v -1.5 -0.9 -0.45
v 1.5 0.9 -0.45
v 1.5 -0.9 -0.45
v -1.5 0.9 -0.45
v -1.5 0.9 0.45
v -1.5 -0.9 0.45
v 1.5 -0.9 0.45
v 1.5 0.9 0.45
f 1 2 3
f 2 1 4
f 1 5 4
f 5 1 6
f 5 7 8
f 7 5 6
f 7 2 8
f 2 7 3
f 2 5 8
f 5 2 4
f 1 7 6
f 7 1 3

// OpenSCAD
// SMD package target overall size: [3.0, 1.8, 0.9] (L, W, H)
// One connected solid, simple rectangular SMD with subtle end terminations.

$fn = 48;

// -------- Parameters --------
L = 3.0;   // X overall
W = 1.8;   // Y overall
H = 0.9;   // Z overall

// Terminations (kept within overall envelope)
term_len   = 0.55;  // along X from each end
term_thk   = 0.08;  // metal thickness (top/bottom)
term_drop  = 0.22;  // wrap down the end face (from top)
term_inset = 0.06;  // inset from Y edges

// Small top mark (subtle)
mark_d = 0.35;
mark_h = 0.03;

overlap = 0.02;     // ensures connectivity / avoids coplanar issues

// -------- Helpers --------
function clamp(v, lo, hi) = v < lo ? lo : (v > hi ? hi : v);

// -------- Body (simple rectangular) --------
module body_solid() {
    cube([L, W, H], center=true);
}

// -------- Termination (end cap) --------
module termination_end(signx=1) {
    x_center = signx*(L/2 - term_len/2);

    term_w = clamp(W - 2*term_inset, 0.2, W);

    union() {
        // Bottom pad (embedded slightly into body for union connectivity)
        translate([x_center, 0, -H/2 + term_thk/2 + overlap])
            cube([term_len, term_w, term_thk + 2*overlap], center=true);

        // Top pad (embedded slightly into body for union connectivity)
        translate([x_center, 0,  H/2 - term_thk/2 - overlap])
            cube([term_len, term_w, term_thk + 2*overlap], center=true);

        // End-face wrap (kept within overall length; sits at end face)
        // Centered at x = +/- (L/2 - term_thk/2) so it does not protrude beyond L.
        translate([signx*(L/2 - term_thk/2), 0, H/2 - term_drop/2])
            cube([term_thk, term_w, term_drop], center=true);
    }
}

// -------- Small top mark (connected) --------
module top_mark() {
    translate([0, 0, H/2 - mark_h/2 - overlap])
        cylinder(d=mark_d, h=mark_h + 2*overlap, center=true);
}

// -------- Complete package (ONE connected solid) --------
module smd_complete() {
    union() {
        body_solid();
        termination_end(-1);
        termination_end( 1);
        top_mark();
    }
}

smd_complete();
